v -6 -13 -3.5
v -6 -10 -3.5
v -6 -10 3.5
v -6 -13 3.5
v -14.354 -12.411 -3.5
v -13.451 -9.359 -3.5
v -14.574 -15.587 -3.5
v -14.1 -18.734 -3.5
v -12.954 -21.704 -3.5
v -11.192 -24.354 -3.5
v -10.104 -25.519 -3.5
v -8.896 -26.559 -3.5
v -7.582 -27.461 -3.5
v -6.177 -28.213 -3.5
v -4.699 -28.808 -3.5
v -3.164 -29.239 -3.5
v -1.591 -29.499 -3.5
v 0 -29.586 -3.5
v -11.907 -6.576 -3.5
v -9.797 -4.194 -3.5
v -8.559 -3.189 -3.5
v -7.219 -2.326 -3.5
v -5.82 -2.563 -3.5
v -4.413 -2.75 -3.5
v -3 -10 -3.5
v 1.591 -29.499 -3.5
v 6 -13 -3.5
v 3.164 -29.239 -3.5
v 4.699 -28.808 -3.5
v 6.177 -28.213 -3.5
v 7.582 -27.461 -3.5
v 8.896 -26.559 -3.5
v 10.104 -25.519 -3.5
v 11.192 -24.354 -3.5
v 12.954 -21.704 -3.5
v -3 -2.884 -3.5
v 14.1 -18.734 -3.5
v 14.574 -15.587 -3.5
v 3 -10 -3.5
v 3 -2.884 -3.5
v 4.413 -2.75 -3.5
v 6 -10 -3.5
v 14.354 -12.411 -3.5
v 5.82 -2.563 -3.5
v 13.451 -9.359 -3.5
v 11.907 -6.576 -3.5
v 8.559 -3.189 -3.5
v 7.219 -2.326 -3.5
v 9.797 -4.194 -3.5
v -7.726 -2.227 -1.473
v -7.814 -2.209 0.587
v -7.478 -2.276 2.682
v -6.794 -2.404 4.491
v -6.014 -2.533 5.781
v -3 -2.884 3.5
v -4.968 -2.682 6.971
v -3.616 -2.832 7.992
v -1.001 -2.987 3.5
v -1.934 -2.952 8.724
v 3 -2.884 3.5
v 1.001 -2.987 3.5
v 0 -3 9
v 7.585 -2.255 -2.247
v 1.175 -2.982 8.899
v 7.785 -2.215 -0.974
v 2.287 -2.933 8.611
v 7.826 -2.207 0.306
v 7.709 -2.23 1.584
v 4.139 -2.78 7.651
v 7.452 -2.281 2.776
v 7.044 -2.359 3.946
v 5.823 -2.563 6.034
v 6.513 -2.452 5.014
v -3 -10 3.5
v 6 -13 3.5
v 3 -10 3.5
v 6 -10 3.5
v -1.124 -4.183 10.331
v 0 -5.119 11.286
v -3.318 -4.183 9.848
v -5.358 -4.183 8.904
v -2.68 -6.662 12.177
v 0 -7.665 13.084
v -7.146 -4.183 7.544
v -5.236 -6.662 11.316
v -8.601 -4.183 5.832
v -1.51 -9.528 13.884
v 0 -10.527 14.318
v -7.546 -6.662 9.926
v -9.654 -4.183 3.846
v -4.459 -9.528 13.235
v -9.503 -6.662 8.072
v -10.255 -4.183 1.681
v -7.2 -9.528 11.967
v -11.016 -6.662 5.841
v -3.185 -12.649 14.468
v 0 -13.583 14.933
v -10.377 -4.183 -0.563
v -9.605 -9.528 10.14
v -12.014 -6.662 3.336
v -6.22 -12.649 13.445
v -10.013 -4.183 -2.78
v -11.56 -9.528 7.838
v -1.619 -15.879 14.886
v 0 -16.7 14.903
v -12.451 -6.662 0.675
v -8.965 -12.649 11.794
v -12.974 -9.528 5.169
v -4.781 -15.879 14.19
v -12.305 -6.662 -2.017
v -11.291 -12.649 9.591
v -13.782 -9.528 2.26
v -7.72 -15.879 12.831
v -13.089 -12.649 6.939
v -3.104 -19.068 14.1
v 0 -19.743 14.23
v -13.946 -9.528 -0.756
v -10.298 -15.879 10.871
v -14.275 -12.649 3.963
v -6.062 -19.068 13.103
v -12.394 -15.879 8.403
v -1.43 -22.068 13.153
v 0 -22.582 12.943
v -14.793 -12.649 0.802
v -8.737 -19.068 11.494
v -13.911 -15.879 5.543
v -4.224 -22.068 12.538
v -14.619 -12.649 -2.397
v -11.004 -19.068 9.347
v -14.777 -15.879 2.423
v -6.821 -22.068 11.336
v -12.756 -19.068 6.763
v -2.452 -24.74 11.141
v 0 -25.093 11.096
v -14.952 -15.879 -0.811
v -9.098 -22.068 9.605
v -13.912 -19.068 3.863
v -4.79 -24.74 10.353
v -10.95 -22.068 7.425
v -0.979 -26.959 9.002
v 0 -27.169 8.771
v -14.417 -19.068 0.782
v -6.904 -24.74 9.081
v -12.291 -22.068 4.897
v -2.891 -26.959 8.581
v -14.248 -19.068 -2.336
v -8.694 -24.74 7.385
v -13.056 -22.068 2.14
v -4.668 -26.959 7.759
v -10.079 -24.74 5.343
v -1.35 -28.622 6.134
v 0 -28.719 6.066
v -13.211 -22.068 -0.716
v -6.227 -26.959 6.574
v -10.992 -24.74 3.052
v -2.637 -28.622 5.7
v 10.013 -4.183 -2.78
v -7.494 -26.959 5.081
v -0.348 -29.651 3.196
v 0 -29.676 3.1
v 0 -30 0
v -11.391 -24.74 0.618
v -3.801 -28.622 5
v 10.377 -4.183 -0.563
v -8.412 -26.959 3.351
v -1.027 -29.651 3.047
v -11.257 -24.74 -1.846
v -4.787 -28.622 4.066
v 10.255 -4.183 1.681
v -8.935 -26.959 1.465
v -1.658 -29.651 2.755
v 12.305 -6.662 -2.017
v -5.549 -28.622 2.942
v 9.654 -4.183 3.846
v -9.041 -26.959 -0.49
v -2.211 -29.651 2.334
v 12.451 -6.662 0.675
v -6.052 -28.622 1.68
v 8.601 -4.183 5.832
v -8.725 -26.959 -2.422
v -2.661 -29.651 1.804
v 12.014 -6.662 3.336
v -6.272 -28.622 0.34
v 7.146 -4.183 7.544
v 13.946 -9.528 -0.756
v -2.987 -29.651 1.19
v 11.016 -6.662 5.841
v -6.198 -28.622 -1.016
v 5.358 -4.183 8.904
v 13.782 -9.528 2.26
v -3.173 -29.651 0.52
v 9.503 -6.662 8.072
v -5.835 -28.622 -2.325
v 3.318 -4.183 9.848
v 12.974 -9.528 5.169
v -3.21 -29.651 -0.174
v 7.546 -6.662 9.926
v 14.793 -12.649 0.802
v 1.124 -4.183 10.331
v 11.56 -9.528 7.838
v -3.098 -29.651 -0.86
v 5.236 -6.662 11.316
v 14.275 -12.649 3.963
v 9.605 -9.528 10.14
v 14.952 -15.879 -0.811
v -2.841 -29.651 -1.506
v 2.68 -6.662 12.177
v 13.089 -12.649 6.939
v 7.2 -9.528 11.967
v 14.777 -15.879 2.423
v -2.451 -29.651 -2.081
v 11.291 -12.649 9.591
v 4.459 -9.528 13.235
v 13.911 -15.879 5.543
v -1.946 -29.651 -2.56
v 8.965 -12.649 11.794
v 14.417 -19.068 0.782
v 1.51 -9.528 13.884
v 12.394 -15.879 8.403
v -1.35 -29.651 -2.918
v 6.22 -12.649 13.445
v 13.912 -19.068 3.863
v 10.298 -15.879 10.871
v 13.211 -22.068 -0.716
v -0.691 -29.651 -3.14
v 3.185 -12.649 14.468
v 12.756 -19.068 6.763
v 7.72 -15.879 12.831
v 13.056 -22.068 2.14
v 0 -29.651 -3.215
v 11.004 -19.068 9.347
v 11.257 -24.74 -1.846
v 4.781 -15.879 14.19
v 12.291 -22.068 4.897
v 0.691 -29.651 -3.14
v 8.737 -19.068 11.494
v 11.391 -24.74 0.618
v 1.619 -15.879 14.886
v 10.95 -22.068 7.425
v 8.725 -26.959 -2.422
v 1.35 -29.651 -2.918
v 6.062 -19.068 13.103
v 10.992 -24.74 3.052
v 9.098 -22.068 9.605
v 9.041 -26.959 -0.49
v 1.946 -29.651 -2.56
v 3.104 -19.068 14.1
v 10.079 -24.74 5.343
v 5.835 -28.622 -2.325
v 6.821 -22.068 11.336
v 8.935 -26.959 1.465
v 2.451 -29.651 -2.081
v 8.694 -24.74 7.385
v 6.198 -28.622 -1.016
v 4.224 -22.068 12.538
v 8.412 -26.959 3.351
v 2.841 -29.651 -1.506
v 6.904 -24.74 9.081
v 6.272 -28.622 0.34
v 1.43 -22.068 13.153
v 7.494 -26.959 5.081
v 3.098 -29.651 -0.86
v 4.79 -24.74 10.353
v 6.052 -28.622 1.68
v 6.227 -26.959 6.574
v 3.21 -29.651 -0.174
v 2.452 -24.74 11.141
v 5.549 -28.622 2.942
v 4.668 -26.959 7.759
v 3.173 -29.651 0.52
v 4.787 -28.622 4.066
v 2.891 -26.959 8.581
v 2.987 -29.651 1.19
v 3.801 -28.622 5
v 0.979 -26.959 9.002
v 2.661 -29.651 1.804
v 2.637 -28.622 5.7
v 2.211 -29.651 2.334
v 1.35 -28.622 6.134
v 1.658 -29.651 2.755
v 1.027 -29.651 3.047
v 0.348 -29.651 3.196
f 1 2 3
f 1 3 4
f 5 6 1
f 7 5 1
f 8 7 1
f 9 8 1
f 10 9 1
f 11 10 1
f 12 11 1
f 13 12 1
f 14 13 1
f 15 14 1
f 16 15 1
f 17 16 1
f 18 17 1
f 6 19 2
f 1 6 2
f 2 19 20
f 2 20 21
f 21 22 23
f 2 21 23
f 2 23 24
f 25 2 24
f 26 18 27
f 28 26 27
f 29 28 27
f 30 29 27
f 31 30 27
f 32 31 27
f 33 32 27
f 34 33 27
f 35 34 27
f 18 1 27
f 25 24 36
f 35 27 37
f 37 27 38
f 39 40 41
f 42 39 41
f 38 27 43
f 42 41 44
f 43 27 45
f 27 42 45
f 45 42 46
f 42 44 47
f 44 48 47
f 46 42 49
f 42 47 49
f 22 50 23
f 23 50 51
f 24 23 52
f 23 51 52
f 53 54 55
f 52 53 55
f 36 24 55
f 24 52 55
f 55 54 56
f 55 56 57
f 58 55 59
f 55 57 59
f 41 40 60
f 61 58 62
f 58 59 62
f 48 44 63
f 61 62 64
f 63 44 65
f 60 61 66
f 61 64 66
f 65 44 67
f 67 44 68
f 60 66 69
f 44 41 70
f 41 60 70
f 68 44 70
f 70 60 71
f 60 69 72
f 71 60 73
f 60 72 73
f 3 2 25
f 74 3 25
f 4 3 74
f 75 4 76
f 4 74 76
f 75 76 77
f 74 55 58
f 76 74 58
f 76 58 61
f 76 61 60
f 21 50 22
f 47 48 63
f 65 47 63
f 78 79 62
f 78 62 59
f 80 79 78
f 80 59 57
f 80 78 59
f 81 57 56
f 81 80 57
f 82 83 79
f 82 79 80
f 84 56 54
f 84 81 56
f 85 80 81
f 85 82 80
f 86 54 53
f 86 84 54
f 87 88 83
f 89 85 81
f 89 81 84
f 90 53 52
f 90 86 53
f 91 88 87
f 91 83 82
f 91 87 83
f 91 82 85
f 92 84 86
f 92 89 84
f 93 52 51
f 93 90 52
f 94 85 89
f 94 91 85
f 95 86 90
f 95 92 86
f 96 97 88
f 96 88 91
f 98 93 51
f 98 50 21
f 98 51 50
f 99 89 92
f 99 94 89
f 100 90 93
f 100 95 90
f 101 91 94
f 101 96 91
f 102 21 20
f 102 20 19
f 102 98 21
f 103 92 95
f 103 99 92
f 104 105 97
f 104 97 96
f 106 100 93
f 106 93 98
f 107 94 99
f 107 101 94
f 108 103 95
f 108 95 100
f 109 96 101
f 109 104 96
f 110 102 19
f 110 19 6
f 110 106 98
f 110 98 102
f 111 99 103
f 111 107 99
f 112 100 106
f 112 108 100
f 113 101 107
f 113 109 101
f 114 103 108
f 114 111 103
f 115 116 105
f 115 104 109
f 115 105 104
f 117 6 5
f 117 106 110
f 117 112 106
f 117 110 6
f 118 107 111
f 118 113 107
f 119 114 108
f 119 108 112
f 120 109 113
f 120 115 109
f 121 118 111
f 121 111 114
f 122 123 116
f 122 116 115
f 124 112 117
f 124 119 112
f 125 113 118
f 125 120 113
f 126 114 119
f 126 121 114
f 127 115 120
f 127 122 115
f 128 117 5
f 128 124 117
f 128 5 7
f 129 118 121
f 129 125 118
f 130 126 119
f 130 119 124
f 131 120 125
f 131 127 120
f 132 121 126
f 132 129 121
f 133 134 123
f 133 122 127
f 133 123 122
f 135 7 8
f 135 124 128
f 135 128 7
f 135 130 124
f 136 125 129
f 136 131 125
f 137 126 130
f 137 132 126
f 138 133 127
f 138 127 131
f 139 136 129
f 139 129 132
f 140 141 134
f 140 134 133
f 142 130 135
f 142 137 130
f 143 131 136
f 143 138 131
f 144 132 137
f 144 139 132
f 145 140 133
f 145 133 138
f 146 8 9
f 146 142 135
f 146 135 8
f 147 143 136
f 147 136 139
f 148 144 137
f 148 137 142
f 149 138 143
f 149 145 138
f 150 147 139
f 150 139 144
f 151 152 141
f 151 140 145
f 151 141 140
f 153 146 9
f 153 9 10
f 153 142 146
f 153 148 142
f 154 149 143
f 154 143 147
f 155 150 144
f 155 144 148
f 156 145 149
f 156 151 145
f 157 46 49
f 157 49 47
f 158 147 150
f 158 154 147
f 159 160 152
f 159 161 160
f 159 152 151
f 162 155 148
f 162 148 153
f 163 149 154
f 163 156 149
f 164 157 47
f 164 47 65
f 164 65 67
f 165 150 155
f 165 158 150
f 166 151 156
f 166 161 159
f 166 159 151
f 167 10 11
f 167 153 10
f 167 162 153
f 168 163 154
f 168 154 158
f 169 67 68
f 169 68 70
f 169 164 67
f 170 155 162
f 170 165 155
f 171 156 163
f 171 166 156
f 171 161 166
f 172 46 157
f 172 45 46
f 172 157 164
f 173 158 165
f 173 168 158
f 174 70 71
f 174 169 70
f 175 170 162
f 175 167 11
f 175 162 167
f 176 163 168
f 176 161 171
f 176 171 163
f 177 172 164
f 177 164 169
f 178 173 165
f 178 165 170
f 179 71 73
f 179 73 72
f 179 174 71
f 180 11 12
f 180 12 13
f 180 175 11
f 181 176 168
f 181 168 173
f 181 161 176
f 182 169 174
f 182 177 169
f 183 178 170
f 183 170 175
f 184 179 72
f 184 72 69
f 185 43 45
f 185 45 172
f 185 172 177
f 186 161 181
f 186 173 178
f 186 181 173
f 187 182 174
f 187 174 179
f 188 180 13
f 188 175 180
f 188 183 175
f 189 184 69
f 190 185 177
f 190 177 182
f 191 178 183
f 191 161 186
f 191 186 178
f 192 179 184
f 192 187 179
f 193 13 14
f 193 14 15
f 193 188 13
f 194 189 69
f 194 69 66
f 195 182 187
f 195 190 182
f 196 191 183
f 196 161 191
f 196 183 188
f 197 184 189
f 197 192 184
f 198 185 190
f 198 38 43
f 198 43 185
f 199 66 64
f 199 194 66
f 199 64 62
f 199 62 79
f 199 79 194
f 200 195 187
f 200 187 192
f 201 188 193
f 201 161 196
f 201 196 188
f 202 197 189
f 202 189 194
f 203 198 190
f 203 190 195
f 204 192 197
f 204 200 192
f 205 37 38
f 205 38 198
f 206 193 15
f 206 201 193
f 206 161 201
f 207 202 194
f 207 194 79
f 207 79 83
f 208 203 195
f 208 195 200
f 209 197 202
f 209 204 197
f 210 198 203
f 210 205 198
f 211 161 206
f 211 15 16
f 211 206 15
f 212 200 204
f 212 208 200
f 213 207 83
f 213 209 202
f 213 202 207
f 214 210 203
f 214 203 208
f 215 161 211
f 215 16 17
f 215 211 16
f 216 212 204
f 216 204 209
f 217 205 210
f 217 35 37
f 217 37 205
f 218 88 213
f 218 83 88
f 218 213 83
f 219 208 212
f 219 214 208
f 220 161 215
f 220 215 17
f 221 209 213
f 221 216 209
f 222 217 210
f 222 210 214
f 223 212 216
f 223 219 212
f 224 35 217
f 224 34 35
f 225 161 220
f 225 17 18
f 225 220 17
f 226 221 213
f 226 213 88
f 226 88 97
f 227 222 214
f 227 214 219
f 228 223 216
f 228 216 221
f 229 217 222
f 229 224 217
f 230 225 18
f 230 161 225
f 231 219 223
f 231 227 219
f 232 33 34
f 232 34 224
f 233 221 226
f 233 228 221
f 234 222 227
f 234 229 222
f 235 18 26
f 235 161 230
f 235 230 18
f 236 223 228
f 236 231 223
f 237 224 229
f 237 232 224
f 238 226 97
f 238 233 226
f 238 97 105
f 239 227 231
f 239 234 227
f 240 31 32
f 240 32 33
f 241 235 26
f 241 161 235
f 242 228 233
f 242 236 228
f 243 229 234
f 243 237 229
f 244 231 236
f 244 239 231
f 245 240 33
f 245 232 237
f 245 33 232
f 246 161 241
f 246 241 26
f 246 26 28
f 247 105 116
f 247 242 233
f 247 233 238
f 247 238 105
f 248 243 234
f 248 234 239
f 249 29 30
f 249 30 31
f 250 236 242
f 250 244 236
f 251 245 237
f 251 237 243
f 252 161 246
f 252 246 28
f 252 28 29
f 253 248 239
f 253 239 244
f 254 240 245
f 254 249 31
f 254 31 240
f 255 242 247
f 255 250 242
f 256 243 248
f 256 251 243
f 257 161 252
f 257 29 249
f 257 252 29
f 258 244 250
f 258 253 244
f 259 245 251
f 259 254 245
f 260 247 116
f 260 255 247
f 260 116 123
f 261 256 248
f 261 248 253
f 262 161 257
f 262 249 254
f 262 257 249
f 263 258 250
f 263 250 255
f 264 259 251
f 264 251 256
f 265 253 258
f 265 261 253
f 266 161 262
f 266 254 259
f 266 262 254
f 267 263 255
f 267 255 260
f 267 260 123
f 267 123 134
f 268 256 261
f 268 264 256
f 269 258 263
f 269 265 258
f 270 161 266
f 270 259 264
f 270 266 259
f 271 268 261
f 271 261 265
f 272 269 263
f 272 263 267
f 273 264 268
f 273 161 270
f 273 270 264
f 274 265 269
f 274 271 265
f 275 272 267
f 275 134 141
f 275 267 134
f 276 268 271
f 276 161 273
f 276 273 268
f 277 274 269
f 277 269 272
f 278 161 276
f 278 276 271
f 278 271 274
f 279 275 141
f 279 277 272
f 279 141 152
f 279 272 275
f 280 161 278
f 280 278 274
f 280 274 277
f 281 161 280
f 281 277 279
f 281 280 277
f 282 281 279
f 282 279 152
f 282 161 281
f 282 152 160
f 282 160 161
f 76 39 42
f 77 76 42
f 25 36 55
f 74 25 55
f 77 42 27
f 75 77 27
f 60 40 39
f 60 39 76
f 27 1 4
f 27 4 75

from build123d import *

# Parameters (mm, degrees)
F4_DEPTH  = 30.001
F5_W      = 6
F5_H      = 7
F6_DEPTH  = 13
F7_W      = 38.173924
F7_H      = 20
F8_DEPTH  = 30.001
F9_W      = 3
F9_H      = 3
F10_DEPTH = 7
F11_DEPTH = 30.001


with BuildPart() as f1:
    # F0 (on Right) → F1 (revolve)
    with BuildSketch(Plane.YZ):
        with BuildLine():
            Line((-30, 0), (0, 0))
            ThreePointArc((0, 0), (-15, 15), (-30, 0))
        make_face()
    revolve(axis=Axis((0, -15, 0), (0, -1, 0)))

    # F3 (on offset) → F4 (cut, through all)
    with BuildSketch(Plane.XY.offset(15)):
        with BuildLine():
            Line((15, 0), (0, 0))
            Line((0, 0), (-15, 0))
            ThreePointArc((-15, 0), (0, -3), (15, 0))
        make_face()
    extrude(amount=-F4_DEPTH, mode=Mode.SUBTRACT)

    # F5 (on Front) → F6 (cut)
    with BuildSketch(Plane.XZ):
        Rectangle(F5_W, F5_H)
    extrude(amount=F6_DEPTH, mode=Mode.SUBTRACT)

    # F7 (on Front) → F8 (cut, through all)
    with BuildSketch(Plane.XZ):
        with Locations((0, -13.5)):
            Rectangle(F7_W, F7_H)
    extrude(amount=F8_DEPTH, mode=Mode.SUBTRACT)

    # F9 (on face) → F10 (cut)
    with BuildSketch(Plane(origin=(0, 0, -3.5), x_dir=(1, 0, 0), z_dir=(0, 0, -1))):
        with Locations((-4.5, 11.5)):
            Rectangle(F9_W, F9_H)
        with Locations((4.5, 11.5)):
            Rectangle(F9_W, F9_H)
    extrude(amount=-F10_DEPTH, mode=Mode.SUBTRACT)

    # F7 (on Front) → F11 (cut, through all)
    with BuildSketch(Plane.XZ):
        with Locations((0, -13.5)):
            Rectangle(F7_W, F7_H)
    extrude(amount=F11_DEPTH, mode=Mode.SUBTRACT)


solid = f1.part
